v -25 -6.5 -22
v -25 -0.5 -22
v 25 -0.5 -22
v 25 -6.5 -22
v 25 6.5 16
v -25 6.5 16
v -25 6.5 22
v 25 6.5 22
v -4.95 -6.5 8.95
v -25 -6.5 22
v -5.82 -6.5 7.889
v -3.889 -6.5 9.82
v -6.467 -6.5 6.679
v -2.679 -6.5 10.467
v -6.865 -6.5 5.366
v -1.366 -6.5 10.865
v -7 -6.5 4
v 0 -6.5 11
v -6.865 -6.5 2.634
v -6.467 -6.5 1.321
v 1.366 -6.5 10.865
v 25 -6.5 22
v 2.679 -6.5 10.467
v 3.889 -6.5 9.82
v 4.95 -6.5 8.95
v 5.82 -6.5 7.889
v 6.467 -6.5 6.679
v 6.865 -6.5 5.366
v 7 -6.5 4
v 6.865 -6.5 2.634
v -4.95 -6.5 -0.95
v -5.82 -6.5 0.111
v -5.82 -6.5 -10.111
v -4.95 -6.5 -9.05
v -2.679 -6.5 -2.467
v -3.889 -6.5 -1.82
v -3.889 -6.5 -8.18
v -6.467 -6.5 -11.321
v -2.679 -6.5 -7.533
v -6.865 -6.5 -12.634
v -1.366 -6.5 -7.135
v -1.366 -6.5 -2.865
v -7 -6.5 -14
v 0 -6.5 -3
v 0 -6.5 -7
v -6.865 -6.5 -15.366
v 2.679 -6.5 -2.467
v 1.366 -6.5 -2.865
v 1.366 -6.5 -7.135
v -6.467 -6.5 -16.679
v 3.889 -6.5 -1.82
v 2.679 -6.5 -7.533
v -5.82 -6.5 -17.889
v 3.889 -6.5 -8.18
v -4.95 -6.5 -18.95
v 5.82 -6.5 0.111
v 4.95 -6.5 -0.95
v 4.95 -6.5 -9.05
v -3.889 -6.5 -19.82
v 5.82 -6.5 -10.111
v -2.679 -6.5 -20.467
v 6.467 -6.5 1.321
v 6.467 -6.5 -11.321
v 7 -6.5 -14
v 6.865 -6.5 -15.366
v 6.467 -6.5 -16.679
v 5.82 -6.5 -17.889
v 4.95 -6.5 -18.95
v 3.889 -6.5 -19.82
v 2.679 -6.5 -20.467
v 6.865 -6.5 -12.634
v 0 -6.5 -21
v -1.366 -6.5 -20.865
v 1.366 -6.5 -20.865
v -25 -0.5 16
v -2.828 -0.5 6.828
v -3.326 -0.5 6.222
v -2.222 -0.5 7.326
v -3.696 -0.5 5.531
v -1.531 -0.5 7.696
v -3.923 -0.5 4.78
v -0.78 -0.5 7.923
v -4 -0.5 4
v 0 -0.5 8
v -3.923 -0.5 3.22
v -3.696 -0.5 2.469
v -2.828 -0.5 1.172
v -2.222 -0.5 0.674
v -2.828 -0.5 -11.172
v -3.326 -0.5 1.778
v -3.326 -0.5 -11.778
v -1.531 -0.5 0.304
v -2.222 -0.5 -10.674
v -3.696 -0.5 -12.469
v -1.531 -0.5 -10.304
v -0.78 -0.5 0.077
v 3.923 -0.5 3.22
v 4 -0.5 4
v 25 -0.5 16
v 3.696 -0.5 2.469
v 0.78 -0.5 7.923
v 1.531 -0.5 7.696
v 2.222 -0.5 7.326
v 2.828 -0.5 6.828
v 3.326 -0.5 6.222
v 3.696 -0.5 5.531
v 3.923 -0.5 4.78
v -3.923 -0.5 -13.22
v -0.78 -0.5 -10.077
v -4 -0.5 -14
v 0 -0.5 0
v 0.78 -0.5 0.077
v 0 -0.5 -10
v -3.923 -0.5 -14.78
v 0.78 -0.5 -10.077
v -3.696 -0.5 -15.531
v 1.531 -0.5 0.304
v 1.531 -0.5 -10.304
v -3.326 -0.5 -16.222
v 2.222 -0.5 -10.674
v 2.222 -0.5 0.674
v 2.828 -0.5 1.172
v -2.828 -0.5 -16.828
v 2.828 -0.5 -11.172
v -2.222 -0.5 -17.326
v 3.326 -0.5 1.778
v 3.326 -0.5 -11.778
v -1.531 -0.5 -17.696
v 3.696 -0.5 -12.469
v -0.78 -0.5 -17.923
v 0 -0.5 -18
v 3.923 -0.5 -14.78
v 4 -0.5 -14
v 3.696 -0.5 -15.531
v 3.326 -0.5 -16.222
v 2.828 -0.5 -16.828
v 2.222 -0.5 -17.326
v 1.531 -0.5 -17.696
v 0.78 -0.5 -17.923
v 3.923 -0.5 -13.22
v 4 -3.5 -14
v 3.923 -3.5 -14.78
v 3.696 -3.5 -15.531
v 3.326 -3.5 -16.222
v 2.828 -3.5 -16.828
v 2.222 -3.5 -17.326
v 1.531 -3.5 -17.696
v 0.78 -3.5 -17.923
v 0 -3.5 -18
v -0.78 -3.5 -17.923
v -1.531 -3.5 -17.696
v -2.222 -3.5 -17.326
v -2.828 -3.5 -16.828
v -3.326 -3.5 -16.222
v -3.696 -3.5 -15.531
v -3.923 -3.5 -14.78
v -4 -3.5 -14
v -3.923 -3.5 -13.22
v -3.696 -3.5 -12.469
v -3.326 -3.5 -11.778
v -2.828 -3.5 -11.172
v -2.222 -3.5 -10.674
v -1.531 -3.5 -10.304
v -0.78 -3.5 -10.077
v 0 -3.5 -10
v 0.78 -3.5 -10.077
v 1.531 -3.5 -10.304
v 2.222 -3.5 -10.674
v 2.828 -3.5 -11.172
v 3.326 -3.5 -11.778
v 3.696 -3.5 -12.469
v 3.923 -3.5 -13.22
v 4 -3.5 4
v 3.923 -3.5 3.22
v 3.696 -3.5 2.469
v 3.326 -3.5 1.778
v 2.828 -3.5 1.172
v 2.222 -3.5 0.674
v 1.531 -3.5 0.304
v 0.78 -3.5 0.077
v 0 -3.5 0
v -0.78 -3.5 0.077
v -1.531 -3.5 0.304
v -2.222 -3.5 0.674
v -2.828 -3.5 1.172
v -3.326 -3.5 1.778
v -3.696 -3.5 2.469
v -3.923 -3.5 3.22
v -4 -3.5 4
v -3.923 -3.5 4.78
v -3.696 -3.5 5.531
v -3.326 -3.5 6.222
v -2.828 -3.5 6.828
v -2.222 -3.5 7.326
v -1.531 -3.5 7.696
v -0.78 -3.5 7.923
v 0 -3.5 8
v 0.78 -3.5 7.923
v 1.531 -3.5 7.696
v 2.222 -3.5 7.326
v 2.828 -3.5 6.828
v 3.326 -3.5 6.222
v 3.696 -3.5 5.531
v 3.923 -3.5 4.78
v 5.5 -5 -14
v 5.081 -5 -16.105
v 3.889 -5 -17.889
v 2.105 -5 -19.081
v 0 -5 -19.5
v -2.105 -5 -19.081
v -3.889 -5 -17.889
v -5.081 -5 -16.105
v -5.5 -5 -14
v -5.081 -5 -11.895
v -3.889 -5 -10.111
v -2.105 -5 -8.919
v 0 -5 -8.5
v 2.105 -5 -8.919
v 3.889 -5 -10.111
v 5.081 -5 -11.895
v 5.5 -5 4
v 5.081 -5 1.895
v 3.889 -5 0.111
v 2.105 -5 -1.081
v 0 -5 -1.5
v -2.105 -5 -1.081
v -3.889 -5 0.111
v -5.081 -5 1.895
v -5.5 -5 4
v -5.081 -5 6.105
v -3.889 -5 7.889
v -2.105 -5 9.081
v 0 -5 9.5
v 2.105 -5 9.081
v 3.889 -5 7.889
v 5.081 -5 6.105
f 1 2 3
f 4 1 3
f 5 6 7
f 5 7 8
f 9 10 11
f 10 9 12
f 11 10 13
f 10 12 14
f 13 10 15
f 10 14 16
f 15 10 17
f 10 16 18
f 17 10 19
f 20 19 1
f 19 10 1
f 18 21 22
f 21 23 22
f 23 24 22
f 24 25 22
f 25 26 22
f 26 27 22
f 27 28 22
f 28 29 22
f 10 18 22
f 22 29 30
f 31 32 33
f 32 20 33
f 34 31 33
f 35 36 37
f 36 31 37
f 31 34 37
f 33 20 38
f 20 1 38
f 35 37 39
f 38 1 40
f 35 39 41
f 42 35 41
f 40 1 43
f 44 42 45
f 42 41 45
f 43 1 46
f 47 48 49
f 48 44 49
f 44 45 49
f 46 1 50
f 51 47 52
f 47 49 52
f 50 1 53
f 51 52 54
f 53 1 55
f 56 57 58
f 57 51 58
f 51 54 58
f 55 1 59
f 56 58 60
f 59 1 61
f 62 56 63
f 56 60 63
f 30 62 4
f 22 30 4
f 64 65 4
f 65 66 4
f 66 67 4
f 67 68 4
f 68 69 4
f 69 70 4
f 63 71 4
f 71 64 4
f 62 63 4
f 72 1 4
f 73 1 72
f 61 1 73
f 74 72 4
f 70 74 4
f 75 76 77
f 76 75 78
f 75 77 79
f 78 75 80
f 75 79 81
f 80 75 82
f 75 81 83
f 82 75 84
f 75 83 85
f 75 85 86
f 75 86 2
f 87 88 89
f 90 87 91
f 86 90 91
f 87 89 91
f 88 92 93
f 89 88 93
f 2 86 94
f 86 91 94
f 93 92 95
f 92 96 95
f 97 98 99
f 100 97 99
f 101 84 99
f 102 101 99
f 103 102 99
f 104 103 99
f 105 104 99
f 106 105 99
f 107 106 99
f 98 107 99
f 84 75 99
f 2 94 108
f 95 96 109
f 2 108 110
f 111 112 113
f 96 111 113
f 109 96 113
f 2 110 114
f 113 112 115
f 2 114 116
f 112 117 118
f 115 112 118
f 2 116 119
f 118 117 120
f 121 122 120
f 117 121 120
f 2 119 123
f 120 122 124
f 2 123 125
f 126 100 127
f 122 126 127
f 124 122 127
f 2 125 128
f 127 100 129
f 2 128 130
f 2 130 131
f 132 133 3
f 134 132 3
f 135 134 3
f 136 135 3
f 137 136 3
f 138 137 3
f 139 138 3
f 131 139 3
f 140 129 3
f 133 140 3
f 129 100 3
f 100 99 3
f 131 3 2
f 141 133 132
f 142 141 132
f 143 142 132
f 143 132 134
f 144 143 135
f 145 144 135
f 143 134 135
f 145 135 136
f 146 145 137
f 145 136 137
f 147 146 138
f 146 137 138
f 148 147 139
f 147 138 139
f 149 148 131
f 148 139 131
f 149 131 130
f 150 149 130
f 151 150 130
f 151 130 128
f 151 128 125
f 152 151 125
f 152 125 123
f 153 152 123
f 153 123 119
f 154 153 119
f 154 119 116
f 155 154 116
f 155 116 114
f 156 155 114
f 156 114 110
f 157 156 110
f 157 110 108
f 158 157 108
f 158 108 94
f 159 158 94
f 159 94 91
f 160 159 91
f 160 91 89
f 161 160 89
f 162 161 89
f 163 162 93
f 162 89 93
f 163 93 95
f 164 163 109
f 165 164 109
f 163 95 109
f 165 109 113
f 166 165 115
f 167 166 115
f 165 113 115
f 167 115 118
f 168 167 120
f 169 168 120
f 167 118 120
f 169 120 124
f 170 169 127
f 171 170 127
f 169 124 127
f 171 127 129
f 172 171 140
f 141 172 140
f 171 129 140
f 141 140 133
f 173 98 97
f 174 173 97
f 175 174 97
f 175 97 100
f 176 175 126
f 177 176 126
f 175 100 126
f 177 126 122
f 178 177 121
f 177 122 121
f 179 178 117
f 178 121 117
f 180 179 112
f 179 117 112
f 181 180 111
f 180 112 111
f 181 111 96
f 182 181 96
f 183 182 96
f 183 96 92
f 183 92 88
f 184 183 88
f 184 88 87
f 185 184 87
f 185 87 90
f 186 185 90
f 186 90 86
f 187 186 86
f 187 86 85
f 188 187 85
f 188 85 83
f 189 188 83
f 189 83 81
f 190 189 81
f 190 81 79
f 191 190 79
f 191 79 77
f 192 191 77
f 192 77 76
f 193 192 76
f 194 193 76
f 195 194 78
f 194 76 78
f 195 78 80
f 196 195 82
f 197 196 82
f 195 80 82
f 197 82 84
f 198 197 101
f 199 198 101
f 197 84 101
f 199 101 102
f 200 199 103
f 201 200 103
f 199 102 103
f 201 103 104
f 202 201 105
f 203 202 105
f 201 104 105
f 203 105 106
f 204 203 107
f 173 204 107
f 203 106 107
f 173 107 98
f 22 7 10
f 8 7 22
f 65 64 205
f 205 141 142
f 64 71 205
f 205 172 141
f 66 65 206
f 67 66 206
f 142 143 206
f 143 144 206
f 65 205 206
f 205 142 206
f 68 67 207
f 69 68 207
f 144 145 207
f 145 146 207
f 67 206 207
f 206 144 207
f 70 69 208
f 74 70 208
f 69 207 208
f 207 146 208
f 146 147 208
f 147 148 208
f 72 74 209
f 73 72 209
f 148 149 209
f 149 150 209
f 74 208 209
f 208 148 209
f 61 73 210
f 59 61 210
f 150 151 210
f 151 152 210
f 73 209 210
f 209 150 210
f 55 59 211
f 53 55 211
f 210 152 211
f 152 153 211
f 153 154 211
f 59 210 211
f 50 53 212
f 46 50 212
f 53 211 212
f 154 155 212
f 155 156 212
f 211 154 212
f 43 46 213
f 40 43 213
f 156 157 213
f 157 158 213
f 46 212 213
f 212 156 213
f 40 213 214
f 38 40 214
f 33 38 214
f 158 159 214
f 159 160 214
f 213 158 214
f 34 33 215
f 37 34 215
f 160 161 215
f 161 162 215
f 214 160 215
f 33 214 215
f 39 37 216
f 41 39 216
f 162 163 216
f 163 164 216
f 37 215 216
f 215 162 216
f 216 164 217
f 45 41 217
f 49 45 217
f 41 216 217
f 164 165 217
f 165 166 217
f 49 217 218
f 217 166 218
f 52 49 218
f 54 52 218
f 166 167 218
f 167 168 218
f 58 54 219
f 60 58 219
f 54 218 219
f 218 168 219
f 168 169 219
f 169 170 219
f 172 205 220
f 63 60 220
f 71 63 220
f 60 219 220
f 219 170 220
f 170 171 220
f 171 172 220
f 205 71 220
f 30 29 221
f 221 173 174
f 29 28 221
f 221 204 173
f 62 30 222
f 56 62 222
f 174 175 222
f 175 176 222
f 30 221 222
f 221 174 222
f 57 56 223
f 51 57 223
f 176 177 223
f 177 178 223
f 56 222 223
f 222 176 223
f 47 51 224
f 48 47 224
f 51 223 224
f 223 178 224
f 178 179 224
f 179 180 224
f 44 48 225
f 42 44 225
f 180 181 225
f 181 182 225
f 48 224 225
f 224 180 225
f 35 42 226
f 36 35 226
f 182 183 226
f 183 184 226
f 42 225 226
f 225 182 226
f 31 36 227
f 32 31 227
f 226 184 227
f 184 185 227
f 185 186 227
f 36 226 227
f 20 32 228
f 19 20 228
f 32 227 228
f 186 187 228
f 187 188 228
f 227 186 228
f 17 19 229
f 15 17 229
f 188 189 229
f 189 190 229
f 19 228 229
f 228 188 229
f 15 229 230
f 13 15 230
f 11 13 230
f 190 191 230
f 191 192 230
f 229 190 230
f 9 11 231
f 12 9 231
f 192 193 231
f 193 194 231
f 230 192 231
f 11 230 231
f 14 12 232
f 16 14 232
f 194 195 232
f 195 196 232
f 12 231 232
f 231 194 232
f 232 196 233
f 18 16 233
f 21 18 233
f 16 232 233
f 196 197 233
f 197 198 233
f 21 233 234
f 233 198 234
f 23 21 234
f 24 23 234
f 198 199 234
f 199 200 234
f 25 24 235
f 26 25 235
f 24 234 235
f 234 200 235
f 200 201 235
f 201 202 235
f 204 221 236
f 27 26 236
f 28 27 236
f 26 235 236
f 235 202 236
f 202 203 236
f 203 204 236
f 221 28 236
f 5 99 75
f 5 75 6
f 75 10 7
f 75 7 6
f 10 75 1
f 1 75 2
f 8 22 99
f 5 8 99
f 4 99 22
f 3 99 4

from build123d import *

# Parameters (mm, degrees)
SKETCH1_W             = 50
SKETCH1_H             = 44
BOSS_EXTRUDE1_DEPTH   = 6.5
SKETCH2_W             = 38
SKETCH2_H             = 7
CUT_EXTRUDE1_DEPTH    = 56.011362463
F_8_0MM_DOWEL_HOLE1_D = 8
CHAMFER1_SIZE         = 3


with BuildPart() as part:
    # Sketch1 → Boss-Extrude1 (new, symmetric)
    with BuildSketch(Plane(origin=(0, 0, 0), x_dir=(1, 0, 0), z_dir=(0, 1, 0))):
        Rectangle(SKETCH1_W, SKETCH1_H)
    extrude(amount=BOSS_EXTRUDE1_DEPTH, both=True)

    # Sketch2 → Cut-Extrude1 (cut, through all)
    with BuildSketch(Plane(origin=(25, 0, 0), x_dir=(0, 0, -1), z_dir=(1, 0, 0))):
        with Locations((3, 3)):
            Rectangle(SKETCH2_W, SKETCH2_H)
    extrude(amount=-CUT_EXTRUDE1_DEPTH, mode=Mode.SUBTRACT)

    # Ø8.0mm Dowel Hole1 (through all)
    with Locations(Plane(origin=(0, -6.5, 0), x_dir=(-1, 0, 0), z_dir=(0, -1, 0))):
        with Locations((0, 14), (0, -4)):
            Hole(F_8_0MM_DOWEL_HOLE1_D / 2)

    # Chamfer1
    chamfer1_edges = [part.edges().sort_by_distance(p)[0] for p in [
        (-4, -6.5, 4),
        (-4, -6.5, -14),
    ]]
    chamfer(chamfer1_edges, length=CHAMFER1_SIZE)


solid = part.part
